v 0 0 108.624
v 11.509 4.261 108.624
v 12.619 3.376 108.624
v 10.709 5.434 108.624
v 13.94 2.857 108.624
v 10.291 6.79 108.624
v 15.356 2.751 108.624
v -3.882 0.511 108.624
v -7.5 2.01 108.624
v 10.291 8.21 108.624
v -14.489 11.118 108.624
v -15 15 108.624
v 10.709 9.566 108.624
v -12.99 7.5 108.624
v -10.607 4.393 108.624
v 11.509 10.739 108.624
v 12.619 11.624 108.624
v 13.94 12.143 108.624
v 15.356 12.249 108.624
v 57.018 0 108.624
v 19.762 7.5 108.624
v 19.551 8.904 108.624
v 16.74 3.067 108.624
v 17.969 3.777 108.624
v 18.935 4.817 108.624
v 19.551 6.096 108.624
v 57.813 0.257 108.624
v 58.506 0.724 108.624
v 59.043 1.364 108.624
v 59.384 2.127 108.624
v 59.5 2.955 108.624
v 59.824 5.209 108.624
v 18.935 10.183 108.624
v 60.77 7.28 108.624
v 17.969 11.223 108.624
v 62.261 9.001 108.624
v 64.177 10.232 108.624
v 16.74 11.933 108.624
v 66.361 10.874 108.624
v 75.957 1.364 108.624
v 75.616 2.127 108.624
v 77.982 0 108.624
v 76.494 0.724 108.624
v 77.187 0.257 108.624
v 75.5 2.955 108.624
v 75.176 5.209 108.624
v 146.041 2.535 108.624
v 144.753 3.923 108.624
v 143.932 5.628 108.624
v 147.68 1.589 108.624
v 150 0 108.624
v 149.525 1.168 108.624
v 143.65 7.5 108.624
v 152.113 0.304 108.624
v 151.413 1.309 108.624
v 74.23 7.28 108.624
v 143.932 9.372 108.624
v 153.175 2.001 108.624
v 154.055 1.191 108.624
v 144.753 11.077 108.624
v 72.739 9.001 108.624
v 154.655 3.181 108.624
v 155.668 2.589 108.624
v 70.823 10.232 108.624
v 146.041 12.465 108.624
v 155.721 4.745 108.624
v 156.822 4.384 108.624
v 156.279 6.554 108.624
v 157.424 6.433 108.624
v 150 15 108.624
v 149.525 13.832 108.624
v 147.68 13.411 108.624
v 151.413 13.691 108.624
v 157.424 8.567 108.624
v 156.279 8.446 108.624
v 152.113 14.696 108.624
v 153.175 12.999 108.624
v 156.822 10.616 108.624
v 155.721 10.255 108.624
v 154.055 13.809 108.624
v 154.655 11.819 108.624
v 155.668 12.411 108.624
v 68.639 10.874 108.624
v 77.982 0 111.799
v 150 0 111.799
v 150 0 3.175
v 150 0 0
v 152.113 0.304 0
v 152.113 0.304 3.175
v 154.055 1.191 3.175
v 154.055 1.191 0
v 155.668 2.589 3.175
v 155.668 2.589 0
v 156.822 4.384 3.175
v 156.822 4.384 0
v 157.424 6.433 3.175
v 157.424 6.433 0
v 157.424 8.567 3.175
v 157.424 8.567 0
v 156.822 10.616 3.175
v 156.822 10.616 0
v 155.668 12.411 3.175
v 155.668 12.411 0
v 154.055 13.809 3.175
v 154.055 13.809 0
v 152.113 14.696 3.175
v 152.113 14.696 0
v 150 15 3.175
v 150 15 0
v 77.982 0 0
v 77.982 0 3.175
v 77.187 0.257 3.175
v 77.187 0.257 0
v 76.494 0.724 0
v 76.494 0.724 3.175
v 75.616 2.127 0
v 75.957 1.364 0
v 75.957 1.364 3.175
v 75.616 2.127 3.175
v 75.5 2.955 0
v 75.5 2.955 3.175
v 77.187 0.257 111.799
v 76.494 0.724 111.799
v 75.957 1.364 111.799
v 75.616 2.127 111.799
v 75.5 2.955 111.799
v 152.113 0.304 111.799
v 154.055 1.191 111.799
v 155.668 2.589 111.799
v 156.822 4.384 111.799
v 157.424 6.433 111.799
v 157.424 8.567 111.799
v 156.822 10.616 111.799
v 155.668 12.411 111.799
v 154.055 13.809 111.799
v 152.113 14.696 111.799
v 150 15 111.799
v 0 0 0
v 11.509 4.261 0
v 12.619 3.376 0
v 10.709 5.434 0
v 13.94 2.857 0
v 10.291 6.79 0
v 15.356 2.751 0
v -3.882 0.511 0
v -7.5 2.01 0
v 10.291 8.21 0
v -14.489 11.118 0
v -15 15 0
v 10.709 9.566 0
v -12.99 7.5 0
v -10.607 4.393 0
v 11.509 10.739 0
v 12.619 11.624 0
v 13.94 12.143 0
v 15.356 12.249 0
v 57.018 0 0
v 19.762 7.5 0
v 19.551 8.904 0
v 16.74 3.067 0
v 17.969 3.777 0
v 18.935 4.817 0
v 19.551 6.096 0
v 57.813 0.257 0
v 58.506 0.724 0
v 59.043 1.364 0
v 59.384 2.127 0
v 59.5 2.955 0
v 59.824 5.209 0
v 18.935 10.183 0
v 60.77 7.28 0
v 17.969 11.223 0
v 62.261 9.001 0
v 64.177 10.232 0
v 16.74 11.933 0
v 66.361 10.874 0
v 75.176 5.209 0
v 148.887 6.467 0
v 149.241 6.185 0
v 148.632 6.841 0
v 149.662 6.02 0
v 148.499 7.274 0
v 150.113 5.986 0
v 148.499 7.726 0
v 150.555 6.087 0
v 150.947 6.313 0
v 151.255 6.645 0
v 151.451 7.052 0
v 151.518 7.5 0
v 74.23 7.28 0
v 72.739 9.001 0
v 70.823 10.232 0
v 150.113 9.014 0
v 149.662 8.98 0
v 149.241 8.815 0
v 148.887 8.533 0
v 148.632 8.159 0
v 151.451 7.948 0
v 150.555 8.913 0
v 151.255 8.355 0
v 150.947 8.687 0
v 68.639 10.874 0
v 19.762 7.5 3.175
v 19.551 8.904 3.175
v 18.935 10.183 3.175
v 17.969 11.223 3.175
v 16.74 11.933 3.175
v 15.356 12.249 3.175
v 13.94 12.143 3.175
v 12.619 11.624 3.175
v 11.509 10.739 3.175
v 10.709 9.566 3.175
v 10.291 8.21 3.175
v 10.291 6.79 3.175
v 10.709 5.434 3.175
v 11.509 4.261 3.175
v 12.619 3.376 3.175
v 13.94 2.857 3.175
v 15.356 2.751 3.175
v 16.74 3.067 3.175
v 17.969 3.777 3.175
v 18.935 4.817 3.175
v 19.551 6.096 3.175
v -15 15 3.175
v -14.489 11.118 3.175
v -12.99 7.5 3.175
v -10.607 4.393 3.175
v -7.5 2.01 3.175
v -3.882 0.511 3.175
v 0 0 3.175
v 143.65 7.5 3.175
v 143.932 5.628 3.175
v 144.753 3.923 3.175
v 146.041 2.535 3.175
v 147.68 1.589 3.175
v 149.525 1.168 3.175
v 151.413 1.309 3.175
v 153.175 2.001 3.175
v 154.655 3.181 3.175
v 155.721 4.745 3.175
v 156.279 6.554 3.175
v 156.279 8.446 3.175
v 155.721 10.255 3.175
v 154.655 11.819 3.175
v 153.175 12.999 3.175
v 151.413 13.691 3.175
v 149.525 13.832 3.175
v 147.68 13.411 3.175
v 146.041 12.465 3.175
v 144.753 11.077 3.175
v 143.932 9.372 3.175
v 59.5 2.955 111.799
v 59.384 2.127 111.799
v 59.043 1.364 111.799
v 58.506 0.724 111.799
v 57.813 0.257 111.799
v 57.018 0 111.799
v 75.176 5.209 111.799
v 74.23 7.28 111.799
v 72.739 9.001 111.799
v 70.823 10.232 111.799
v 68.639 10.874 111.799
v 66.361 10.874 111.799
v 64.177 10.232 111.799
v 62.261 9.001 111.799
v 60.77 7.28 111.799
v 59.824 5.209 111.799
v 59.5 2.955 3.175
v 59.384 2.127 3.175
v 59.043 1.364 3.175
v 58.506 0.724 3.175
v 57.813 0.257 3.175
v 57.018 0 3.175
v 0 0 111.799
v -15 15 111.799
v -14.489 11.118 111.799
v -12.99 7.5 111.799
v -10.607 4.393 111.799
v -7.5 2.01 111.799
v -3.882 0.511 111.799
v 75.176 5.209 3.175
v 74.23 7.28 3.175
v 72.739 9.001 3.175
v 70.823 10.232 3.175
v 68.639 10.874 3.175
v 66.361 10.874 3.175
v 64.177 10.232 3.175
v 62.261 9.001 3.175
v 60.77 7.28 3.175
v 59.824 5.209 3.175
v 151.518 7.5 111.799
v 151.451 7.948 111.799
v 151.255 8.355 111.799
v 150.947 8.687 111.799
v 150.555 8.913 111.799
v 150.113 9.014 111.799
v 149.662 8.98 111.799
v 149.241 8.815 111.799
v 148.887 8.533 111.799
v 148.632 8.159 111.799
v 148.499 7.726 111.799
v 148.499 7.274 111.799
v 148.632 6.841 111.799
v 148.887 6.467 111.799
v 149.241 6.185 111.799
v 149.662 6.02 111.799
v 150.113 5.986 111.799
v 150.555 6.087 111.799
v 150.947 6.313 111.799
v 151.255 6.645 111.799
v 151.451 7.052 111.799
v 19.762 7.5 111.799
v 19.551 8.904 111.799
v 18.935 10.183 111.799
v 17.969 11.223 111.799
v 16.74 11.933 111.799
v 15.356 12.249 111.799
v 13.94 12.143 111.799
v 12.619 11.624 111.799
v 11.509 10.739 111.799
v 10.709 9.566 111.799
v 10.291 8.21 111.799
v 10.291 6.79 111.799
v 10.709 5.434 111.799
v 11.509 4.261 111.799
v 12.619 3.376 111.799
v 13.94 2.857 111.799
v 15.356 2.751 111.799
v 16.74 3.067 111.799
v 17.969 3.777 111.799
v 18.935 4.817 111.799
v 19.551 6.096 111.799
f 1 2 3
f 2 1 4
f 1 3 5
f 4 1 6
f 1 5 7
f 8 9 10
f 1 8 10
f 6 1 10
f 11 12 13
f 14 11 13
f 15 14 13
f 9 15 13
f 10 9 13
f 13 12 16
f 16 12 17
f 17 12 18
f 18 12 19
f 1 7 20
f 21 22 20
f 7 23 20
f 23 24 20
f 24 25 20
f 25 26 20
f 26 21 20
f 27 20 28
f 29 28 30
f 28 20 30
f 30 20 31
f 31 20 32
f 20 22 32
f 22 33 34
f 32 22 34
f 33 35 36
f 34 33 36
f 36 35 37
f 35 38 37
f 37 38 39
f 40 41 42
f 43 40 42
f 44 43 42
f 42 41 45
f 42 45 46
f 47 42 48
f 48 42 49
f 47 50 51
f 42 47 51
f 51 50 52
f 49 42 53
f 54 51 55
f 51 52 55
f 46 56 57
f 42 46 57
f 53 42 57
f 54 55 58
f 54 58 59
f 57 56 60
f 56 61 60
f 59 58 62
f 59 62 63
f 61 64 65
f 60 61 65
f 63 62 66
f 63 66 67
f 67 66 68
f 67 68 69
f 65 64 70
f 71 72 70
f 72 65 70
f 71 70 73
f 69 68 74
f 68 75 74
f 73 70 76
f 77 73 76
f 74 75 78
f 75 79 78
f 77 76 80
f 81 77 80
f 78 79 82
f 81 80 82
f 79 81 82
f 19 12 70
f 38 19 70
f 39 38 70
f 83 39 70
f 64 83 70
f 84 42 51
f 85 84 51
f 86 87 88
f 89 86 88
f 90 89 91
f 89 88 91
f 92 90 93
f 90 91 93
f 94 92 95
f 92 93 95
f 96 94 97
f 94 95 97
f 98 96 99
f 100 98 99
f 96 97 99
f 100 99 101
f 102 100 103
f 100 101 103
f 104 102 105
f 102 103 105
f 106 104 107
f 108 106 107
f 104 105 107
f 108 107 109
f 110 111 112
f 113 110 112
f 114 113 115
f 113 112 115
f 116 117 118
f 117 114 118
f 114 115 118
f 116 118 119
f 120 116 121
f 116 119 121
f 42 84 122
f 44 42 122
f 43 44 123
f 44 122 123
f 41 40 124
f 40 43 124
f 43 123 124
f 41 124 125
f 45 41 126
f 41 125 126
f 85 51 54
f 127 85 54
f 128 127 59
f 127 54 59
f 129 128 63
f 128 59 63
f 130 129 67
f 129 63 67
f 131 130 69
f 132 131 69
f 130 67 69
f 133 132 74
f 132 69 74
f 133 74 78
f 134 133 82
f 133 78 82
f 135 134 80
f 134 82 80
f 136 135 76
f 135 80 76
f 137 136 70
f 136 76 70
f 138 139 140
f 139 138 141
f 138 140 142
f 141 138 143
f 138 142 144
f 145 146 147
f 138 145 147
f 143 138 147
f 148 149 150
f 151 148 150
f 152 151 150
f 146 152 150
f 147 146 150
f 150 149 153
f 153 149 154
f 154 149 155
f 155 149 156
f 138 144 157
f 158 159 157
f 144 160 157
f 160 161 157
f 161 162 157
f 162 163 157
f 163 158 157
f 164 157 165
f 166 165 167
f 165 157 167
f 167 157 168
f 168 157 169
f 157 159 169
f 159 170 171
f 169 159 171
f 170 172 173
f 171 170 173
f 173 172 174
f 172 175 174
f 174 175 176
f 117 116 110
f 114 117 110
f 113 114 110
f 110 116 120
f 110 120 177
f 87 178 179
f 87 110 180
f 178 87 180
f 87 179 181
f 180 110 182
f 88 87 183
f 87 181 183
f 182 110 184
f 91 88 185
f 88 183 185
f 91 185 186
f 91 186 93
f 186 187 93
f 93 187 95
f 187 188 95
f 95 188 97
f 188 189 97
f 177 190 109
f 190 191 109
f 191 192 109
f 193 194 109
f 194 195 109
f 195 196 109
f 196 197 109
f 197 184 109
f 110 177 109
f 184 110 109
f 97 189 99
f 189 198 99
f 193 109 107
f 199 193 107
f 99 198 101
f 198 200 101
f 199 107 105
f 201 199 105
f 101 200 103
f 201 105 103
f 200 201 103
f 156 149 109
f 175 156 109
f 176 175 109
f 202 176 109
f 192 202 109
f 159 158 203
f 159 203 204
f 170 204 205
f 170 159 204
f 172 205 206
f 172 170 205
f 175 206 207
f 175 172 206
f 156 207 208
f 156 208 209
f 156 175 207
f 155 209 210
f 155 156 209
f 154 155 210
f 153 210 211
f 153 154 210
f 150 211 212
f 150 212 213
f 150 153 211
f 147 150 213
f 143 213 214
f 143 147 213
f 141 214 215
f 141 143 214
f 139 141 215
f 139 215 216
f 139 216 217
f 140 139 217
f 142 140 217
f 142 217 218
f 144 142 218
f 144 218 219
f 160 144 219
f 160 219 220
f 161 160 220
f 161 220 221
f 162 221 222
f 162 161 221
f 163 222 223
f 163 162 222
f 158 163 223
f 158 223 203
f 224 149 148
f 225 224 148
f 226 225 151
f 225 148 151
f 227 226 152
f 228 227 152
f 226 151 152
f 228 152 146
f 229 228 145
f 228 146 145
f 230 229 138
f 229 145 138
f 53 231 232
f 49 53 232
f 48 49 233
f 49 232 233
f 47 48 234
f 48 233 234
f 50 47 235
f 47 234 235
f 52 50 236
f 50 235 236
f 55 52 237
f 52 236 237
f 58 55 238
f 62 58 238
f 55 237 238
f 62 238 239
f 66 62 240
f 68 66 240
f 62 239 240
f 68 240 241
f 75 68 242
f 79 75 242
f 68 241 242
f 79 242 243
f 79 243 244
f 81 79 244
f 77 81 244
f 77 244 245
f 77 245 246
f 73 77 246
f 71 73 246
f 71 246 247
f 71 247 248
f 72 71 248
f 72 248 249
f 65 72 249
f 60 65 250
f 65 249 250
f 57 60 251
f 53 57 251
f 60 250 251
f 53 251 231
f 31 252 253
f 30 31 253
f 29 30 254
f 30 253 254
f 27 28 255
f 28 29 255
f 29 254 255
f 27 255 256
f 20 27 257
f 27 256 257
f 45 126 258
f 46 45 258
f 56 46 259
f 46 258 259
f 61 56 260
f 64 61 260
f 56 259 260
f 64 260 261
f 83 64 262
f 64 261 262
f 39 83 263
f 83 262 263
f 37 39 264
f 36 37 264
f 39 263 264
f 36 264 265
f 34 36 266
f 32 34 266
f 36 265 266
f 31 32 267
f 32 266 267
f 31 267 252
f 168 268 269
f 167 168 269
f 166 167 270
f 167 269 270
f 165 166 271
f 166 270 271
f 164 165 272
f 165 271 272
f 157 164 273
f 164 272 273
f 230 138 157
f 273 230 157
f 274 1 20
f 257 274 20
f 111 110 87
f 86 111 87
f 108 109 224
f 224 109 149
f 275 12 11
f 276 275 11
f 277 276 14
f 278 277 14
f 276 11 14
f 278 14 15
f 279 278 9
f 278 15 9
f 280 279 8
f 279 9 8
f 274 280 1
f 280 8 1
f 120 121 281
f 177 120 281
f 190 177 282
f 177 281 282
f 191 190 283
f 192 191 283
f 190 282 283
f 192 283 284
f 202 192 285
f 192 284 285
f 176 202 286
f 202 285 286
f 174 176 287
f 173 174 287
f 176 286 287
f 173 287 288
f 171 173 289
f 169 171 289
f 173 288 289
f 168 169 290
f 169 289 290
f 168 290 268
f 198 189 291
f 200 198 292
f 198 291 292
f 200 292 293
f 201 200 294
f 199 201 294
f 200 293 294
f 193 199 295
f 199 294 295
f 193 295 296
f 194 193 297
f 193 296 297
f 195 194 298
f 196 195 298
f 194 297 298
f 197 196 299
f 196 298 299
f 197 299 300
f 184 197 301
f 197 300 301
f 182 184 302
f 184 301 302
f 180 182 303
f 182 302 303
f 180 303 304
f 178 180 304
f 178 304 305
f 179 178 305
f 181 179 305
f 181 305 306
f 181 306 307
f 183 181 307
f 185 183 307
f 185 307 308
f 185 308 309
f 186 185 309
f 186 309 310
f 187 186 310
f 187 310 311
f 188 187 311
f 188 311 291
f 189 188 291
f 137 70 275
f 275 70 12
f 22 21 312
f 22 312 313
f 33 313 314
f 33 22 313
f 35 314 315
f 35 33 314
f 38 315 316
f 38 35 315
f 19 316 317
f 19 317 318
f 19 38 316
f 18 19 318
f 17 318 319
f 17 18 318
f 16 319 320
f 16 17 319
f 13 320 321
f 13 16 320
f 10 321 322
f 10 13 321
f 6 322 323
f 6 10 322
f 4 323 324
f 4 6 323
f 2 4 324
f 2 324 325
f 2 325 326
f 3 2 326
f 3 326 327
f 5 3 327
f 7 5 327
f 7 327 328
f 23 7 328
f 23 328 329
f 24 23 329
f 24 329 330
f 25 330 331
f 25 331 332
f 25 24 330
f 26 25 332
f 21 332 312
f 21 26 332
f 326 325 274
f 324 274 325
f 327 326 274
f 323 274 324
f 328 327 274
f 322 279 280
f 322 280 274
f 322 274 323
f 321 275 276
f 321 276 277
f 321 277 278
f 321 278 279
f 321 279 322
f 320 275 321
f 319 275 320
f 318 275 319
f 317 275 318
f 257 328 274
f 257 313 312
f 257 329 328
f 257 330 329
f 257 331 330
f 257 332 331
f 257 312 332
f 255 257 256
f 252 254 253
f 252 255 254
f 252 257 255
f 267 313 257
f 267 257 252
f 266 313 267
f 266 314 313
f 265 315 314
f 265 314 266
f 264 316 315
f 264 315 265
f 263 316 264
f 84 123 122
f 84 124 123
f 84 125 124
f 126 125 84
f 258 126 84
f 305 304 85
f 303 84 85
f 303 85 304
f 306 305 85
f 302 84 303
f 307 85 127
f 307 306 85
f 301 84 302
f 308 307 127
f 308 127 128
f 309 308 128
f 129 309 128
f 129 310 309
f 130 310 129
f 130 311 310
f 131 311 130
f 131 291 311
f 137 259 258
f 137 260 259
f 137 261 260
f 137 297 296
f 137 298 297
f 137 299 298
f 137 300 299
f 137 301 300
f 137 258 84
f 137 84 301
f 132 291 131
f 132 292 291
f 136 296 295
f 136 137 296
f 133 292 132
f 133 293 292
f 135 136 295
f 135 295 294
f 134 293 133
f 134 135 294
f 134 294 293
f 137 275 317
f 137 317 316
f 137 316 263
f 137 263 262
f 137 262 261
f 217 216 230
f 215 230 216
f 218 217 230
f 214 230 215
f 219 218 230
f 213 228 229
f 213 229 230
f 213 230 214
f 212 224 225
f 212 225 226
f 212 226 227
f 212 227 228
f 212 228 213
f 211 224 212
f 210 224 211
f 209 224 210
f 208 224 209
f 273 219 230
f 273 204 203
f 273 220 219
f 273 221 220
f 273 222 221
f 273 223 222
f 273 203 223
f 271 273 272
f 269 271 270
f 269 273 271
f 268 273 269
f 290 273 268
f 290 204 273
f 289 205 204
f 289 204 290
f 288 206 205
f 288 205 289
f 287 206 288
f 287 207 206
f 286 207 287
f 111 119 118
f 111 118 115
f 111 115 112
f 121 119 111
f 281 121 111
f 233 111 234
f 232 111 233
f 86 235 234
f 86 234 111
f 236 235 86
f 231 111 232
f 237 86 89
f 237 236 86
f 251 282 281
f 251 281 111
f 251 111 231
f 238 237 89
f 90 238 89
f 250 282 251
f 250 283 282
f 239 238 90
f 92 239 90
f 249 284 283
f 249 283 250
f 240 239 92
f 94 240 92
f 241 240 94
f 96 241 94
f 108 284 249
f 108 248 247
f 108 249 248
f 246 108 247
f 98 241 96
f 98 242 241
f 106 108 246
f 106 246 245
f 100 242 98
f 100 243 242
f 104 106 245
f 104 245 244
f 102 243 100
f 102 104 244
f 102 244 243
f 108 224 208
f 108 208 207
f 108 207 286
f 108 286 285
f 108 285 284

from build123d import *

# Parameters (mm, degrees)
SKETCH1_R           = 4.7625
BOSS_EXTRUDE1_DEPTH = 3.175
SKETCH2_R           = 6.35
BOSS_EXTRUDE2_DEPTH = 105.4492
SKETCH3_R           = 4.7625
BOSS_EXTRUDE3_DEPTH = 3.175
SKETCH5_R           = 1.518393352
CUT_EXTRUDE1_DEPTH  = 194.727414479


with BuildPart() as part:
    # Sketch1 → Boss-Extrude1 (new body)
    with BuildSketch(Plane.XY):
        with BuildLine():
            Line((0, 0), (150, 0))
            ThreePointArc((150, 0), (157.5, 7.5), (150, 15))
            Line((150, 15), (-15, 15))
            ThreePointArc((-15, 15), (-10.606601718, 4.393398282), (0, 0))
        make_face()
        with Locations((15, 7.5)):
            Circle(SKETCH1_R, mode=Mode.SUBTRACT)
    extrude(amount=BOSS_EXTRUDE1_DEPTH)

    # Sketch2 → Boss-Extrude2 (add)
    with BuildSketch(Plane.XY.offset(3.175)):
        with Locations(Location((150, 7.5, 0), (0, 0, 180))):
            Circle(SKETCH2_R)
    extrude(amount=BOSS_EXTRUDE2_DEPTH)

    # Sketch3 → Boss-Extrude3 (add)
    with BuildSketch(Plane.XY.offset(108.6242)):
        with BuildLine():
            Line((0, 0), (150, 0))
            ThreePointArc((150, 0), (157.5, 7.5), (150, 15))
            Line((150, 15), (-15, 15))
            ThreePointArc((-15, 15), (-10.606601718, 4.393398282), (0, 0))
        make_face()
        with Locations((15, 7.5)):
            Circle(SKETCH3_R, mode=Mode.SUBTRACT)
    extrude(amount=BOSS_EXTRUDE3_DEPTH)

    # Sketch5 → Cut-Extrude1 (cut, through all)
    with BuildSketch(Plane.XY.offset(111.7992)):
        with Locations((150, 7.5)):
            Circle(SKETCH5_R)
        with BuildLine():
            Line((57.017518256, 0), (77.982481744, 0))
            ThreePointArc((77.982481744, 0), (76.202985115, 1.025330402), (75.5, 2.955025356))
            ThreePointArc((75.5, 2.955025356), (67.5, 10.955025356), (59.5, 2.955025356))
            ThreePointArc((59.5, 2.955025356), (58.797014885, 1.025330402), (57.017518256, 0))
        make_face()
    extrude(amount=-CUT_EXTRUDE1_DEPTH, mode=Mode.SUBTRACT)


solid = part.part
